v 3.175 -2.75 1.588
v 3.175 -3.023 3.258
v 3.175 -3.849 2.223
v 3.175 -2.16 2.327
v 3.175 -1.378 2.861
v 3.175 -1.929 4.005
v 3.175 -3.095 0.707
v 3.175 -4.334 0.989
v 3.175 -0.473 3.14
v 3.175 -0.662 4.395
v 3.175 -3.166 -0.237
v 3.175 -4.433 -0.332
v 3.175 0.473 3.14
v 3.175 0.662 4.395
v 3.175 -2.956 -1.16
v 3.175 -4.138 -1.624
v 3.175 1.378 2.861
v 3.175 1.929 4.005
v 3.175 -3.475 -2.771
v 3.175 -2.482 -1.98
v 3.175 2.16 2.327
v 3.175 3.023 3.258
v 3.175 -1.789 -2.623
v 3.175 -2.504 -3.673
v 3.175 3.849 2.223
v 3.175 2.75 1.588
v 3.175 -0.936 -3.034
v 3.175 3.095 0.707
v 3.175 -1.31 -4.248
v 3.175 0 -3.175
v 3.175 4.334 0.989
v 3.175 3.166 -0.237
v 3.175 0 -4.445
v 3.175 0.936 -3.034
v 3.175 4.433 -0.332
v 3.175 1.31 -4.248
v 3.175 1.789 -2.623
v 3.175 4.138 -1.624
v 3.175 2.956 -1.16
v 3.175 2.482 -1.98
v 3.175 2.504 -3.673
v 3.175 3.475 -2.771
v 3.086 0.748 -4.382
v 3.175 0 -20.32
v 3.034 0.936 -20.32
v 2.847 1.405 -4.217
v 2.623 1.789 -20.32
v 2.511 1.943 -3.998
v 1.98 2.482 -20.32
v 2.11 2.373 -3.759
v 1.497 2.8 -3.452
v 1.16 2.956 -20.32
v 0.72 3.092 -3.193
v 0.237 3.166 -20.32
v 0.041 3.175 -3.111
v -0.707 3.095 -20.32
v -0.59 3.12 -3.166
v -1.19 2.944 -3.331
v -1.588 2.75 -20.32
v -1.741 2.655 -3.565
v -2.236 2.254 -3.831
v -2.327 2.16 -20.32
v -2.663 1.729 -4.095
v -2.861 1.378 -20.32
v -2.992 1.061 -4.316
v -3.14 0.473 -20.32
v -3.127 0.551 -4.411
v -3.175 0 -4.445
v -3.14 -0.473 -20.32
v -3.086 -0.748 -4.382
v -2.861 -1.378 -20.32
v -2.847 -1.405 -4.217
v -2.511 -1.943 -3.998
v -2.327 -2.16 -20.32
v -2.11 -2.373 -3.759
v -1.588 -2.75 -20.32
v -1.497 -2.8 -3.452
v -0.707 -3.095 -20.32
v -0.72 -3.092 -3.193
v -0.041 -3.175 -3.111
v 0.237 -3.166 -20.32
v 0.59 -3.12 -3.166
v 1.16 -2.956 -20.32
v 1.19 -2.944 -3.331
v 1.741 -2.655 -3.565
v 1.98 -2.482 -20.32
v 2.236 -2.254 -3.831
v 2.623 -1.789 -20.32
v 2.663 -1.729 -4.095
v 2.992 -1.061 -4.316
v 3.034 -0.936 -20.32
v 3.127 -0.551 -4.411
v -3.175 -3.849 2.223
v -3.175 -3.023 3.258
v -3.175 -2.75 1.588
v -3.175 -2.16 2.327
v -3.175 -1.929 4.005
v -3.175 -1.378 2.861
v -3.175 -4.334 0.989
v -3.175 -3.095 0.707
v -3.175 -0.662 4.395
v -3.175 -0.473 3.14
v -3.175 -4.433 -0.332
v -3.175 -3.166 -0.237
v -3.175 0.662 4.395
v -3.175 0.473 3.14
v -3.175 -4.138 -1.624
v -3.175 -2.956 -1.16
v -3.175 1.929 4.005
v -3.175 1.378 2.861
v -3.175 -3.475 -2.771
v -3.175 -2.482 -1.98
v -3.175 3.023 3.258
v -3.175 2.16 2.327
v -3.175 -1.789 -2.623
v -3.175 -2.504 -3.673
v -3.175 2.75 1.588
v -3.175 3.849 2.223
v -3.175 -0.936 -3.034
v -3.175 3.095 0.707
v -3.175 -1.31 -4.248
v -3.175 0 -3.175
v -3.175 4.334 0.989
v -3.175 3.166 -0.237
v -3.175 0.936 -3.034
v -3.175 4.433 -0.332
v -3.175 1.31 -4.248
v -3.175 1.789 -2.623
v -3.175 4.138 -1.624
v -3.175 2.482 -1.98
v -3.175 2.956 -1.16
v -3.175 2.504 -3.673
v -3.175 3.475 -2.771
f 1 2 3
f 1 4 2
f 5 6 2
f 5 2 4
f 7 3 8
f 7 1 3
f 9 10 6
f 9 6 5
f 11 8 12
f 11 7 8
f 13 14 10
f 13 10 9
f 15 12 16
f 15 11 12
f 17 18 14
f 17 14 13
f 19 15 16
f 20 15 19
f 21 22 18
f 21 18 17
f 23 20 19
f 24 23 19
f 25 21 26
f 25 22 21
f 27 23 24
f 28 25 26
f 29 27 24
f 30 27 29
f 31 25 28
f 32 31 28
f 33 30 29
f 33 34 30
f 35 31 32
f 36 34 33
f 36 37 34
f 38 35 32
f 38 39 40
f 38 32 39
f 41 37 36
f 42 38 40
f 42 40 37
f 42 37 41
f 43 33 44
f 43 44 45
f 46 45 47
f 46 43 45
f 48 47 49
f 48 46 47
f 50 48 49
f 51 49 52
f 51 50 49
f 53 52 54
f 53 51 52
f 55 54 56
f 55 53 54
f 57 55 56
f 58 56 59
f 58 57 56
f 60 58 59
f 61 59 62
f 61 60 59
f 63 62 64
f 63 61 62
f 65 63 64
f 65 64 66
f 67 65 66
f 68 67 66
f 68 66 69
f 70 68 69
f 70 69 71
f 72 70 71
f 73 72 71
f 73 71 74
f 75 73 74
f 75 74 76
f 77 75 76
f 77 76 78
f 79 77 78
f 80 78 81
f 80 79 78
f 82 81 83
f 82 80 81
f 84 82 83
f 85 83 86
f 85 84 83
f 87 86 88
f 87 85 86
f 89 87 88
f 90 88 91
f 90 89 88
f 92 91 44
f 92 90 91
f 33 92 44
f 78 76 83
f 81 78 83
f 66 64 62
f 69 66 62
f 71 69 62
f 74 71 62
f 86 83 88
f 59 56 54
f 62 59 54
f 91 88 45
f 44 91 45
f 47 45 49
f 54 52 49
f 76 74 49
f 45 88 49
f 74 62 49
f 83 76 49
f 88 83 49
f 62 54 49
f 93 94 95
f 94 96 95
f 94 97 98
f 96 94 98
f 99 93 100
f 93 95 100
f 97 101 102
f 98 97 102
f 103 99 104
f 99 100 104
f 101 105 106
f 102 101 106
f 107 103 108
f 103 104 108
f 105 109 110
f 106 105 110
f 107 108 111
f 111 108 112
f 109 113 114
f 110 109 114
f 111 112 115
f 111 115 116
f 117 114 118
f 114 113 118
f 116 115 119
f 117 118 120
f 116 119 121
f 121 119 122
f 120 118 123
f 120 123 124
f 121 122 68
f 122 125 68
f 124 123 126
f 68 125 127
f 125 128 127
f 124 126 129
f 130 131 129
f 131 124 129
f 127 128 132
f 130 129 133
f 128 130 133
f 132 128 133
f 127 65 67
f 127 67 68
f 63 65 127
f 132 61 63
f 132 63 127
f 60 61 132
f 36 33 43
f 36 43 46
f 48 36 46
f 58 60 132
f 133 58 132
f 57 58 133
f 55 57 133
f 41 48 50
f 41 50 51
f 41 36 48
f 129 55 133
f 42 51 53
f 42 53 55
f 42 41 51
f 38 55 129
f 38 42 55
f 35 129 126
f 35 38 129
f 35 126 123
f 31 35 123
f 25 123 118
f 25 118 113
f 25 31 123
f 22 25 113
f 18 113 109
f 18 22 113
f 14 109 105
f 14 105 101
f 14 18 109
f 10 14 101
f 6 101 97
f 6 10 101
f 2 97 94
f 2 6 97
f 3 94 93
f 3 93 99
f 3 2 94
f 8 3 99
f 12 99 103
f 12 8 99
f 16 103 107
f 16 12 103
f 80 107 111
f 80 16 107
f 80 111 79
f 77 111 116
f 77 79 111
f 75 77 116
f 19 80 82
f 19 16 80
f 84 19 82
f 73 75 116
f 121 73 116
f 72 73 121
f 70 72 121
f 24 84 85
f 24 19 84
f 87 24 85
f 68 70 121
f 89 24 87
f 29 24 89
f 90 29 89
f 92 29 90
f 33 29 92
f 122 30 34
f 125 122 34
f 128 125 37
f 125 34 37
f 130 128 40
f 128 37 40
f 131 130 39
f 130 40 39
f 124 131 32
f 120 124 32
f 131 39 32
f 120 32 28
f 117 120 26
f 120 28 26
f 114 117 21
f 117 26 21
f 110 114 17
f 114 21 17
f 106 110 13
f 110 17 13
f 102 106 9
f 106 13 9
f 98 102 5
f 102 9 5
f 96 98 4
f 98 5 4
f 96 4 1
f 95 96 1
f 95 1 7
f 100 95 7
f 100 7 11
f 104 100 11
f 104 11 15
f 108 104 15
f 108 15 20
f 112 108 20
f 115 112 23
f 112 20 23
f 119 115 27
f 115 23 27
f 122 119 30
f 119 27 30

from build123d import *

# Parameters (mm, degrees)
SKETCH2_R           = 3.175
BOSS_EXTRUDE1_DEPTH = 20.32
SKETCH3_R           = 4.445
BOSS_EXTRUDE2_DEPTH = 3.175
SKETCH4_R           = 3.175
CUT_EXTRUDE1_DEPTH  = 6.35


with BuildPart() as part:
    # Sketch2 → Boss-Extrude1 (new body)
    with BuildSketch(Plane.XY):
        Circle(SKETCH2_R)
    extrude(amount=-BOSS_EXTRUDE1_DEPTH)

    # Sketch3 → Boss-Extrude2 (add, symmetric)
    with BuildSketch(Plane(origin=(0, 0, 0), x_dir=(0, 0, -1), z_dir=(1, 0, 0))):
        Circle(SKETCH3_R)
    extrude(amount=BOSS_EXTRUDE2_DEPTH, both=True)

    # Sketch4 → Cut-Extrude1 (cut)
    with BuildSketch(Plane(origin=(3.175, 0, 0), x_dir=(0, 0, -1), z_dir=(1, 0, 0))):
        Circle(SKETCH4_R)
    extrude(amount=-CUT_EXTRUDE1_DEPTH, mode=Mode.SUBTRACT)


solid = part.part
